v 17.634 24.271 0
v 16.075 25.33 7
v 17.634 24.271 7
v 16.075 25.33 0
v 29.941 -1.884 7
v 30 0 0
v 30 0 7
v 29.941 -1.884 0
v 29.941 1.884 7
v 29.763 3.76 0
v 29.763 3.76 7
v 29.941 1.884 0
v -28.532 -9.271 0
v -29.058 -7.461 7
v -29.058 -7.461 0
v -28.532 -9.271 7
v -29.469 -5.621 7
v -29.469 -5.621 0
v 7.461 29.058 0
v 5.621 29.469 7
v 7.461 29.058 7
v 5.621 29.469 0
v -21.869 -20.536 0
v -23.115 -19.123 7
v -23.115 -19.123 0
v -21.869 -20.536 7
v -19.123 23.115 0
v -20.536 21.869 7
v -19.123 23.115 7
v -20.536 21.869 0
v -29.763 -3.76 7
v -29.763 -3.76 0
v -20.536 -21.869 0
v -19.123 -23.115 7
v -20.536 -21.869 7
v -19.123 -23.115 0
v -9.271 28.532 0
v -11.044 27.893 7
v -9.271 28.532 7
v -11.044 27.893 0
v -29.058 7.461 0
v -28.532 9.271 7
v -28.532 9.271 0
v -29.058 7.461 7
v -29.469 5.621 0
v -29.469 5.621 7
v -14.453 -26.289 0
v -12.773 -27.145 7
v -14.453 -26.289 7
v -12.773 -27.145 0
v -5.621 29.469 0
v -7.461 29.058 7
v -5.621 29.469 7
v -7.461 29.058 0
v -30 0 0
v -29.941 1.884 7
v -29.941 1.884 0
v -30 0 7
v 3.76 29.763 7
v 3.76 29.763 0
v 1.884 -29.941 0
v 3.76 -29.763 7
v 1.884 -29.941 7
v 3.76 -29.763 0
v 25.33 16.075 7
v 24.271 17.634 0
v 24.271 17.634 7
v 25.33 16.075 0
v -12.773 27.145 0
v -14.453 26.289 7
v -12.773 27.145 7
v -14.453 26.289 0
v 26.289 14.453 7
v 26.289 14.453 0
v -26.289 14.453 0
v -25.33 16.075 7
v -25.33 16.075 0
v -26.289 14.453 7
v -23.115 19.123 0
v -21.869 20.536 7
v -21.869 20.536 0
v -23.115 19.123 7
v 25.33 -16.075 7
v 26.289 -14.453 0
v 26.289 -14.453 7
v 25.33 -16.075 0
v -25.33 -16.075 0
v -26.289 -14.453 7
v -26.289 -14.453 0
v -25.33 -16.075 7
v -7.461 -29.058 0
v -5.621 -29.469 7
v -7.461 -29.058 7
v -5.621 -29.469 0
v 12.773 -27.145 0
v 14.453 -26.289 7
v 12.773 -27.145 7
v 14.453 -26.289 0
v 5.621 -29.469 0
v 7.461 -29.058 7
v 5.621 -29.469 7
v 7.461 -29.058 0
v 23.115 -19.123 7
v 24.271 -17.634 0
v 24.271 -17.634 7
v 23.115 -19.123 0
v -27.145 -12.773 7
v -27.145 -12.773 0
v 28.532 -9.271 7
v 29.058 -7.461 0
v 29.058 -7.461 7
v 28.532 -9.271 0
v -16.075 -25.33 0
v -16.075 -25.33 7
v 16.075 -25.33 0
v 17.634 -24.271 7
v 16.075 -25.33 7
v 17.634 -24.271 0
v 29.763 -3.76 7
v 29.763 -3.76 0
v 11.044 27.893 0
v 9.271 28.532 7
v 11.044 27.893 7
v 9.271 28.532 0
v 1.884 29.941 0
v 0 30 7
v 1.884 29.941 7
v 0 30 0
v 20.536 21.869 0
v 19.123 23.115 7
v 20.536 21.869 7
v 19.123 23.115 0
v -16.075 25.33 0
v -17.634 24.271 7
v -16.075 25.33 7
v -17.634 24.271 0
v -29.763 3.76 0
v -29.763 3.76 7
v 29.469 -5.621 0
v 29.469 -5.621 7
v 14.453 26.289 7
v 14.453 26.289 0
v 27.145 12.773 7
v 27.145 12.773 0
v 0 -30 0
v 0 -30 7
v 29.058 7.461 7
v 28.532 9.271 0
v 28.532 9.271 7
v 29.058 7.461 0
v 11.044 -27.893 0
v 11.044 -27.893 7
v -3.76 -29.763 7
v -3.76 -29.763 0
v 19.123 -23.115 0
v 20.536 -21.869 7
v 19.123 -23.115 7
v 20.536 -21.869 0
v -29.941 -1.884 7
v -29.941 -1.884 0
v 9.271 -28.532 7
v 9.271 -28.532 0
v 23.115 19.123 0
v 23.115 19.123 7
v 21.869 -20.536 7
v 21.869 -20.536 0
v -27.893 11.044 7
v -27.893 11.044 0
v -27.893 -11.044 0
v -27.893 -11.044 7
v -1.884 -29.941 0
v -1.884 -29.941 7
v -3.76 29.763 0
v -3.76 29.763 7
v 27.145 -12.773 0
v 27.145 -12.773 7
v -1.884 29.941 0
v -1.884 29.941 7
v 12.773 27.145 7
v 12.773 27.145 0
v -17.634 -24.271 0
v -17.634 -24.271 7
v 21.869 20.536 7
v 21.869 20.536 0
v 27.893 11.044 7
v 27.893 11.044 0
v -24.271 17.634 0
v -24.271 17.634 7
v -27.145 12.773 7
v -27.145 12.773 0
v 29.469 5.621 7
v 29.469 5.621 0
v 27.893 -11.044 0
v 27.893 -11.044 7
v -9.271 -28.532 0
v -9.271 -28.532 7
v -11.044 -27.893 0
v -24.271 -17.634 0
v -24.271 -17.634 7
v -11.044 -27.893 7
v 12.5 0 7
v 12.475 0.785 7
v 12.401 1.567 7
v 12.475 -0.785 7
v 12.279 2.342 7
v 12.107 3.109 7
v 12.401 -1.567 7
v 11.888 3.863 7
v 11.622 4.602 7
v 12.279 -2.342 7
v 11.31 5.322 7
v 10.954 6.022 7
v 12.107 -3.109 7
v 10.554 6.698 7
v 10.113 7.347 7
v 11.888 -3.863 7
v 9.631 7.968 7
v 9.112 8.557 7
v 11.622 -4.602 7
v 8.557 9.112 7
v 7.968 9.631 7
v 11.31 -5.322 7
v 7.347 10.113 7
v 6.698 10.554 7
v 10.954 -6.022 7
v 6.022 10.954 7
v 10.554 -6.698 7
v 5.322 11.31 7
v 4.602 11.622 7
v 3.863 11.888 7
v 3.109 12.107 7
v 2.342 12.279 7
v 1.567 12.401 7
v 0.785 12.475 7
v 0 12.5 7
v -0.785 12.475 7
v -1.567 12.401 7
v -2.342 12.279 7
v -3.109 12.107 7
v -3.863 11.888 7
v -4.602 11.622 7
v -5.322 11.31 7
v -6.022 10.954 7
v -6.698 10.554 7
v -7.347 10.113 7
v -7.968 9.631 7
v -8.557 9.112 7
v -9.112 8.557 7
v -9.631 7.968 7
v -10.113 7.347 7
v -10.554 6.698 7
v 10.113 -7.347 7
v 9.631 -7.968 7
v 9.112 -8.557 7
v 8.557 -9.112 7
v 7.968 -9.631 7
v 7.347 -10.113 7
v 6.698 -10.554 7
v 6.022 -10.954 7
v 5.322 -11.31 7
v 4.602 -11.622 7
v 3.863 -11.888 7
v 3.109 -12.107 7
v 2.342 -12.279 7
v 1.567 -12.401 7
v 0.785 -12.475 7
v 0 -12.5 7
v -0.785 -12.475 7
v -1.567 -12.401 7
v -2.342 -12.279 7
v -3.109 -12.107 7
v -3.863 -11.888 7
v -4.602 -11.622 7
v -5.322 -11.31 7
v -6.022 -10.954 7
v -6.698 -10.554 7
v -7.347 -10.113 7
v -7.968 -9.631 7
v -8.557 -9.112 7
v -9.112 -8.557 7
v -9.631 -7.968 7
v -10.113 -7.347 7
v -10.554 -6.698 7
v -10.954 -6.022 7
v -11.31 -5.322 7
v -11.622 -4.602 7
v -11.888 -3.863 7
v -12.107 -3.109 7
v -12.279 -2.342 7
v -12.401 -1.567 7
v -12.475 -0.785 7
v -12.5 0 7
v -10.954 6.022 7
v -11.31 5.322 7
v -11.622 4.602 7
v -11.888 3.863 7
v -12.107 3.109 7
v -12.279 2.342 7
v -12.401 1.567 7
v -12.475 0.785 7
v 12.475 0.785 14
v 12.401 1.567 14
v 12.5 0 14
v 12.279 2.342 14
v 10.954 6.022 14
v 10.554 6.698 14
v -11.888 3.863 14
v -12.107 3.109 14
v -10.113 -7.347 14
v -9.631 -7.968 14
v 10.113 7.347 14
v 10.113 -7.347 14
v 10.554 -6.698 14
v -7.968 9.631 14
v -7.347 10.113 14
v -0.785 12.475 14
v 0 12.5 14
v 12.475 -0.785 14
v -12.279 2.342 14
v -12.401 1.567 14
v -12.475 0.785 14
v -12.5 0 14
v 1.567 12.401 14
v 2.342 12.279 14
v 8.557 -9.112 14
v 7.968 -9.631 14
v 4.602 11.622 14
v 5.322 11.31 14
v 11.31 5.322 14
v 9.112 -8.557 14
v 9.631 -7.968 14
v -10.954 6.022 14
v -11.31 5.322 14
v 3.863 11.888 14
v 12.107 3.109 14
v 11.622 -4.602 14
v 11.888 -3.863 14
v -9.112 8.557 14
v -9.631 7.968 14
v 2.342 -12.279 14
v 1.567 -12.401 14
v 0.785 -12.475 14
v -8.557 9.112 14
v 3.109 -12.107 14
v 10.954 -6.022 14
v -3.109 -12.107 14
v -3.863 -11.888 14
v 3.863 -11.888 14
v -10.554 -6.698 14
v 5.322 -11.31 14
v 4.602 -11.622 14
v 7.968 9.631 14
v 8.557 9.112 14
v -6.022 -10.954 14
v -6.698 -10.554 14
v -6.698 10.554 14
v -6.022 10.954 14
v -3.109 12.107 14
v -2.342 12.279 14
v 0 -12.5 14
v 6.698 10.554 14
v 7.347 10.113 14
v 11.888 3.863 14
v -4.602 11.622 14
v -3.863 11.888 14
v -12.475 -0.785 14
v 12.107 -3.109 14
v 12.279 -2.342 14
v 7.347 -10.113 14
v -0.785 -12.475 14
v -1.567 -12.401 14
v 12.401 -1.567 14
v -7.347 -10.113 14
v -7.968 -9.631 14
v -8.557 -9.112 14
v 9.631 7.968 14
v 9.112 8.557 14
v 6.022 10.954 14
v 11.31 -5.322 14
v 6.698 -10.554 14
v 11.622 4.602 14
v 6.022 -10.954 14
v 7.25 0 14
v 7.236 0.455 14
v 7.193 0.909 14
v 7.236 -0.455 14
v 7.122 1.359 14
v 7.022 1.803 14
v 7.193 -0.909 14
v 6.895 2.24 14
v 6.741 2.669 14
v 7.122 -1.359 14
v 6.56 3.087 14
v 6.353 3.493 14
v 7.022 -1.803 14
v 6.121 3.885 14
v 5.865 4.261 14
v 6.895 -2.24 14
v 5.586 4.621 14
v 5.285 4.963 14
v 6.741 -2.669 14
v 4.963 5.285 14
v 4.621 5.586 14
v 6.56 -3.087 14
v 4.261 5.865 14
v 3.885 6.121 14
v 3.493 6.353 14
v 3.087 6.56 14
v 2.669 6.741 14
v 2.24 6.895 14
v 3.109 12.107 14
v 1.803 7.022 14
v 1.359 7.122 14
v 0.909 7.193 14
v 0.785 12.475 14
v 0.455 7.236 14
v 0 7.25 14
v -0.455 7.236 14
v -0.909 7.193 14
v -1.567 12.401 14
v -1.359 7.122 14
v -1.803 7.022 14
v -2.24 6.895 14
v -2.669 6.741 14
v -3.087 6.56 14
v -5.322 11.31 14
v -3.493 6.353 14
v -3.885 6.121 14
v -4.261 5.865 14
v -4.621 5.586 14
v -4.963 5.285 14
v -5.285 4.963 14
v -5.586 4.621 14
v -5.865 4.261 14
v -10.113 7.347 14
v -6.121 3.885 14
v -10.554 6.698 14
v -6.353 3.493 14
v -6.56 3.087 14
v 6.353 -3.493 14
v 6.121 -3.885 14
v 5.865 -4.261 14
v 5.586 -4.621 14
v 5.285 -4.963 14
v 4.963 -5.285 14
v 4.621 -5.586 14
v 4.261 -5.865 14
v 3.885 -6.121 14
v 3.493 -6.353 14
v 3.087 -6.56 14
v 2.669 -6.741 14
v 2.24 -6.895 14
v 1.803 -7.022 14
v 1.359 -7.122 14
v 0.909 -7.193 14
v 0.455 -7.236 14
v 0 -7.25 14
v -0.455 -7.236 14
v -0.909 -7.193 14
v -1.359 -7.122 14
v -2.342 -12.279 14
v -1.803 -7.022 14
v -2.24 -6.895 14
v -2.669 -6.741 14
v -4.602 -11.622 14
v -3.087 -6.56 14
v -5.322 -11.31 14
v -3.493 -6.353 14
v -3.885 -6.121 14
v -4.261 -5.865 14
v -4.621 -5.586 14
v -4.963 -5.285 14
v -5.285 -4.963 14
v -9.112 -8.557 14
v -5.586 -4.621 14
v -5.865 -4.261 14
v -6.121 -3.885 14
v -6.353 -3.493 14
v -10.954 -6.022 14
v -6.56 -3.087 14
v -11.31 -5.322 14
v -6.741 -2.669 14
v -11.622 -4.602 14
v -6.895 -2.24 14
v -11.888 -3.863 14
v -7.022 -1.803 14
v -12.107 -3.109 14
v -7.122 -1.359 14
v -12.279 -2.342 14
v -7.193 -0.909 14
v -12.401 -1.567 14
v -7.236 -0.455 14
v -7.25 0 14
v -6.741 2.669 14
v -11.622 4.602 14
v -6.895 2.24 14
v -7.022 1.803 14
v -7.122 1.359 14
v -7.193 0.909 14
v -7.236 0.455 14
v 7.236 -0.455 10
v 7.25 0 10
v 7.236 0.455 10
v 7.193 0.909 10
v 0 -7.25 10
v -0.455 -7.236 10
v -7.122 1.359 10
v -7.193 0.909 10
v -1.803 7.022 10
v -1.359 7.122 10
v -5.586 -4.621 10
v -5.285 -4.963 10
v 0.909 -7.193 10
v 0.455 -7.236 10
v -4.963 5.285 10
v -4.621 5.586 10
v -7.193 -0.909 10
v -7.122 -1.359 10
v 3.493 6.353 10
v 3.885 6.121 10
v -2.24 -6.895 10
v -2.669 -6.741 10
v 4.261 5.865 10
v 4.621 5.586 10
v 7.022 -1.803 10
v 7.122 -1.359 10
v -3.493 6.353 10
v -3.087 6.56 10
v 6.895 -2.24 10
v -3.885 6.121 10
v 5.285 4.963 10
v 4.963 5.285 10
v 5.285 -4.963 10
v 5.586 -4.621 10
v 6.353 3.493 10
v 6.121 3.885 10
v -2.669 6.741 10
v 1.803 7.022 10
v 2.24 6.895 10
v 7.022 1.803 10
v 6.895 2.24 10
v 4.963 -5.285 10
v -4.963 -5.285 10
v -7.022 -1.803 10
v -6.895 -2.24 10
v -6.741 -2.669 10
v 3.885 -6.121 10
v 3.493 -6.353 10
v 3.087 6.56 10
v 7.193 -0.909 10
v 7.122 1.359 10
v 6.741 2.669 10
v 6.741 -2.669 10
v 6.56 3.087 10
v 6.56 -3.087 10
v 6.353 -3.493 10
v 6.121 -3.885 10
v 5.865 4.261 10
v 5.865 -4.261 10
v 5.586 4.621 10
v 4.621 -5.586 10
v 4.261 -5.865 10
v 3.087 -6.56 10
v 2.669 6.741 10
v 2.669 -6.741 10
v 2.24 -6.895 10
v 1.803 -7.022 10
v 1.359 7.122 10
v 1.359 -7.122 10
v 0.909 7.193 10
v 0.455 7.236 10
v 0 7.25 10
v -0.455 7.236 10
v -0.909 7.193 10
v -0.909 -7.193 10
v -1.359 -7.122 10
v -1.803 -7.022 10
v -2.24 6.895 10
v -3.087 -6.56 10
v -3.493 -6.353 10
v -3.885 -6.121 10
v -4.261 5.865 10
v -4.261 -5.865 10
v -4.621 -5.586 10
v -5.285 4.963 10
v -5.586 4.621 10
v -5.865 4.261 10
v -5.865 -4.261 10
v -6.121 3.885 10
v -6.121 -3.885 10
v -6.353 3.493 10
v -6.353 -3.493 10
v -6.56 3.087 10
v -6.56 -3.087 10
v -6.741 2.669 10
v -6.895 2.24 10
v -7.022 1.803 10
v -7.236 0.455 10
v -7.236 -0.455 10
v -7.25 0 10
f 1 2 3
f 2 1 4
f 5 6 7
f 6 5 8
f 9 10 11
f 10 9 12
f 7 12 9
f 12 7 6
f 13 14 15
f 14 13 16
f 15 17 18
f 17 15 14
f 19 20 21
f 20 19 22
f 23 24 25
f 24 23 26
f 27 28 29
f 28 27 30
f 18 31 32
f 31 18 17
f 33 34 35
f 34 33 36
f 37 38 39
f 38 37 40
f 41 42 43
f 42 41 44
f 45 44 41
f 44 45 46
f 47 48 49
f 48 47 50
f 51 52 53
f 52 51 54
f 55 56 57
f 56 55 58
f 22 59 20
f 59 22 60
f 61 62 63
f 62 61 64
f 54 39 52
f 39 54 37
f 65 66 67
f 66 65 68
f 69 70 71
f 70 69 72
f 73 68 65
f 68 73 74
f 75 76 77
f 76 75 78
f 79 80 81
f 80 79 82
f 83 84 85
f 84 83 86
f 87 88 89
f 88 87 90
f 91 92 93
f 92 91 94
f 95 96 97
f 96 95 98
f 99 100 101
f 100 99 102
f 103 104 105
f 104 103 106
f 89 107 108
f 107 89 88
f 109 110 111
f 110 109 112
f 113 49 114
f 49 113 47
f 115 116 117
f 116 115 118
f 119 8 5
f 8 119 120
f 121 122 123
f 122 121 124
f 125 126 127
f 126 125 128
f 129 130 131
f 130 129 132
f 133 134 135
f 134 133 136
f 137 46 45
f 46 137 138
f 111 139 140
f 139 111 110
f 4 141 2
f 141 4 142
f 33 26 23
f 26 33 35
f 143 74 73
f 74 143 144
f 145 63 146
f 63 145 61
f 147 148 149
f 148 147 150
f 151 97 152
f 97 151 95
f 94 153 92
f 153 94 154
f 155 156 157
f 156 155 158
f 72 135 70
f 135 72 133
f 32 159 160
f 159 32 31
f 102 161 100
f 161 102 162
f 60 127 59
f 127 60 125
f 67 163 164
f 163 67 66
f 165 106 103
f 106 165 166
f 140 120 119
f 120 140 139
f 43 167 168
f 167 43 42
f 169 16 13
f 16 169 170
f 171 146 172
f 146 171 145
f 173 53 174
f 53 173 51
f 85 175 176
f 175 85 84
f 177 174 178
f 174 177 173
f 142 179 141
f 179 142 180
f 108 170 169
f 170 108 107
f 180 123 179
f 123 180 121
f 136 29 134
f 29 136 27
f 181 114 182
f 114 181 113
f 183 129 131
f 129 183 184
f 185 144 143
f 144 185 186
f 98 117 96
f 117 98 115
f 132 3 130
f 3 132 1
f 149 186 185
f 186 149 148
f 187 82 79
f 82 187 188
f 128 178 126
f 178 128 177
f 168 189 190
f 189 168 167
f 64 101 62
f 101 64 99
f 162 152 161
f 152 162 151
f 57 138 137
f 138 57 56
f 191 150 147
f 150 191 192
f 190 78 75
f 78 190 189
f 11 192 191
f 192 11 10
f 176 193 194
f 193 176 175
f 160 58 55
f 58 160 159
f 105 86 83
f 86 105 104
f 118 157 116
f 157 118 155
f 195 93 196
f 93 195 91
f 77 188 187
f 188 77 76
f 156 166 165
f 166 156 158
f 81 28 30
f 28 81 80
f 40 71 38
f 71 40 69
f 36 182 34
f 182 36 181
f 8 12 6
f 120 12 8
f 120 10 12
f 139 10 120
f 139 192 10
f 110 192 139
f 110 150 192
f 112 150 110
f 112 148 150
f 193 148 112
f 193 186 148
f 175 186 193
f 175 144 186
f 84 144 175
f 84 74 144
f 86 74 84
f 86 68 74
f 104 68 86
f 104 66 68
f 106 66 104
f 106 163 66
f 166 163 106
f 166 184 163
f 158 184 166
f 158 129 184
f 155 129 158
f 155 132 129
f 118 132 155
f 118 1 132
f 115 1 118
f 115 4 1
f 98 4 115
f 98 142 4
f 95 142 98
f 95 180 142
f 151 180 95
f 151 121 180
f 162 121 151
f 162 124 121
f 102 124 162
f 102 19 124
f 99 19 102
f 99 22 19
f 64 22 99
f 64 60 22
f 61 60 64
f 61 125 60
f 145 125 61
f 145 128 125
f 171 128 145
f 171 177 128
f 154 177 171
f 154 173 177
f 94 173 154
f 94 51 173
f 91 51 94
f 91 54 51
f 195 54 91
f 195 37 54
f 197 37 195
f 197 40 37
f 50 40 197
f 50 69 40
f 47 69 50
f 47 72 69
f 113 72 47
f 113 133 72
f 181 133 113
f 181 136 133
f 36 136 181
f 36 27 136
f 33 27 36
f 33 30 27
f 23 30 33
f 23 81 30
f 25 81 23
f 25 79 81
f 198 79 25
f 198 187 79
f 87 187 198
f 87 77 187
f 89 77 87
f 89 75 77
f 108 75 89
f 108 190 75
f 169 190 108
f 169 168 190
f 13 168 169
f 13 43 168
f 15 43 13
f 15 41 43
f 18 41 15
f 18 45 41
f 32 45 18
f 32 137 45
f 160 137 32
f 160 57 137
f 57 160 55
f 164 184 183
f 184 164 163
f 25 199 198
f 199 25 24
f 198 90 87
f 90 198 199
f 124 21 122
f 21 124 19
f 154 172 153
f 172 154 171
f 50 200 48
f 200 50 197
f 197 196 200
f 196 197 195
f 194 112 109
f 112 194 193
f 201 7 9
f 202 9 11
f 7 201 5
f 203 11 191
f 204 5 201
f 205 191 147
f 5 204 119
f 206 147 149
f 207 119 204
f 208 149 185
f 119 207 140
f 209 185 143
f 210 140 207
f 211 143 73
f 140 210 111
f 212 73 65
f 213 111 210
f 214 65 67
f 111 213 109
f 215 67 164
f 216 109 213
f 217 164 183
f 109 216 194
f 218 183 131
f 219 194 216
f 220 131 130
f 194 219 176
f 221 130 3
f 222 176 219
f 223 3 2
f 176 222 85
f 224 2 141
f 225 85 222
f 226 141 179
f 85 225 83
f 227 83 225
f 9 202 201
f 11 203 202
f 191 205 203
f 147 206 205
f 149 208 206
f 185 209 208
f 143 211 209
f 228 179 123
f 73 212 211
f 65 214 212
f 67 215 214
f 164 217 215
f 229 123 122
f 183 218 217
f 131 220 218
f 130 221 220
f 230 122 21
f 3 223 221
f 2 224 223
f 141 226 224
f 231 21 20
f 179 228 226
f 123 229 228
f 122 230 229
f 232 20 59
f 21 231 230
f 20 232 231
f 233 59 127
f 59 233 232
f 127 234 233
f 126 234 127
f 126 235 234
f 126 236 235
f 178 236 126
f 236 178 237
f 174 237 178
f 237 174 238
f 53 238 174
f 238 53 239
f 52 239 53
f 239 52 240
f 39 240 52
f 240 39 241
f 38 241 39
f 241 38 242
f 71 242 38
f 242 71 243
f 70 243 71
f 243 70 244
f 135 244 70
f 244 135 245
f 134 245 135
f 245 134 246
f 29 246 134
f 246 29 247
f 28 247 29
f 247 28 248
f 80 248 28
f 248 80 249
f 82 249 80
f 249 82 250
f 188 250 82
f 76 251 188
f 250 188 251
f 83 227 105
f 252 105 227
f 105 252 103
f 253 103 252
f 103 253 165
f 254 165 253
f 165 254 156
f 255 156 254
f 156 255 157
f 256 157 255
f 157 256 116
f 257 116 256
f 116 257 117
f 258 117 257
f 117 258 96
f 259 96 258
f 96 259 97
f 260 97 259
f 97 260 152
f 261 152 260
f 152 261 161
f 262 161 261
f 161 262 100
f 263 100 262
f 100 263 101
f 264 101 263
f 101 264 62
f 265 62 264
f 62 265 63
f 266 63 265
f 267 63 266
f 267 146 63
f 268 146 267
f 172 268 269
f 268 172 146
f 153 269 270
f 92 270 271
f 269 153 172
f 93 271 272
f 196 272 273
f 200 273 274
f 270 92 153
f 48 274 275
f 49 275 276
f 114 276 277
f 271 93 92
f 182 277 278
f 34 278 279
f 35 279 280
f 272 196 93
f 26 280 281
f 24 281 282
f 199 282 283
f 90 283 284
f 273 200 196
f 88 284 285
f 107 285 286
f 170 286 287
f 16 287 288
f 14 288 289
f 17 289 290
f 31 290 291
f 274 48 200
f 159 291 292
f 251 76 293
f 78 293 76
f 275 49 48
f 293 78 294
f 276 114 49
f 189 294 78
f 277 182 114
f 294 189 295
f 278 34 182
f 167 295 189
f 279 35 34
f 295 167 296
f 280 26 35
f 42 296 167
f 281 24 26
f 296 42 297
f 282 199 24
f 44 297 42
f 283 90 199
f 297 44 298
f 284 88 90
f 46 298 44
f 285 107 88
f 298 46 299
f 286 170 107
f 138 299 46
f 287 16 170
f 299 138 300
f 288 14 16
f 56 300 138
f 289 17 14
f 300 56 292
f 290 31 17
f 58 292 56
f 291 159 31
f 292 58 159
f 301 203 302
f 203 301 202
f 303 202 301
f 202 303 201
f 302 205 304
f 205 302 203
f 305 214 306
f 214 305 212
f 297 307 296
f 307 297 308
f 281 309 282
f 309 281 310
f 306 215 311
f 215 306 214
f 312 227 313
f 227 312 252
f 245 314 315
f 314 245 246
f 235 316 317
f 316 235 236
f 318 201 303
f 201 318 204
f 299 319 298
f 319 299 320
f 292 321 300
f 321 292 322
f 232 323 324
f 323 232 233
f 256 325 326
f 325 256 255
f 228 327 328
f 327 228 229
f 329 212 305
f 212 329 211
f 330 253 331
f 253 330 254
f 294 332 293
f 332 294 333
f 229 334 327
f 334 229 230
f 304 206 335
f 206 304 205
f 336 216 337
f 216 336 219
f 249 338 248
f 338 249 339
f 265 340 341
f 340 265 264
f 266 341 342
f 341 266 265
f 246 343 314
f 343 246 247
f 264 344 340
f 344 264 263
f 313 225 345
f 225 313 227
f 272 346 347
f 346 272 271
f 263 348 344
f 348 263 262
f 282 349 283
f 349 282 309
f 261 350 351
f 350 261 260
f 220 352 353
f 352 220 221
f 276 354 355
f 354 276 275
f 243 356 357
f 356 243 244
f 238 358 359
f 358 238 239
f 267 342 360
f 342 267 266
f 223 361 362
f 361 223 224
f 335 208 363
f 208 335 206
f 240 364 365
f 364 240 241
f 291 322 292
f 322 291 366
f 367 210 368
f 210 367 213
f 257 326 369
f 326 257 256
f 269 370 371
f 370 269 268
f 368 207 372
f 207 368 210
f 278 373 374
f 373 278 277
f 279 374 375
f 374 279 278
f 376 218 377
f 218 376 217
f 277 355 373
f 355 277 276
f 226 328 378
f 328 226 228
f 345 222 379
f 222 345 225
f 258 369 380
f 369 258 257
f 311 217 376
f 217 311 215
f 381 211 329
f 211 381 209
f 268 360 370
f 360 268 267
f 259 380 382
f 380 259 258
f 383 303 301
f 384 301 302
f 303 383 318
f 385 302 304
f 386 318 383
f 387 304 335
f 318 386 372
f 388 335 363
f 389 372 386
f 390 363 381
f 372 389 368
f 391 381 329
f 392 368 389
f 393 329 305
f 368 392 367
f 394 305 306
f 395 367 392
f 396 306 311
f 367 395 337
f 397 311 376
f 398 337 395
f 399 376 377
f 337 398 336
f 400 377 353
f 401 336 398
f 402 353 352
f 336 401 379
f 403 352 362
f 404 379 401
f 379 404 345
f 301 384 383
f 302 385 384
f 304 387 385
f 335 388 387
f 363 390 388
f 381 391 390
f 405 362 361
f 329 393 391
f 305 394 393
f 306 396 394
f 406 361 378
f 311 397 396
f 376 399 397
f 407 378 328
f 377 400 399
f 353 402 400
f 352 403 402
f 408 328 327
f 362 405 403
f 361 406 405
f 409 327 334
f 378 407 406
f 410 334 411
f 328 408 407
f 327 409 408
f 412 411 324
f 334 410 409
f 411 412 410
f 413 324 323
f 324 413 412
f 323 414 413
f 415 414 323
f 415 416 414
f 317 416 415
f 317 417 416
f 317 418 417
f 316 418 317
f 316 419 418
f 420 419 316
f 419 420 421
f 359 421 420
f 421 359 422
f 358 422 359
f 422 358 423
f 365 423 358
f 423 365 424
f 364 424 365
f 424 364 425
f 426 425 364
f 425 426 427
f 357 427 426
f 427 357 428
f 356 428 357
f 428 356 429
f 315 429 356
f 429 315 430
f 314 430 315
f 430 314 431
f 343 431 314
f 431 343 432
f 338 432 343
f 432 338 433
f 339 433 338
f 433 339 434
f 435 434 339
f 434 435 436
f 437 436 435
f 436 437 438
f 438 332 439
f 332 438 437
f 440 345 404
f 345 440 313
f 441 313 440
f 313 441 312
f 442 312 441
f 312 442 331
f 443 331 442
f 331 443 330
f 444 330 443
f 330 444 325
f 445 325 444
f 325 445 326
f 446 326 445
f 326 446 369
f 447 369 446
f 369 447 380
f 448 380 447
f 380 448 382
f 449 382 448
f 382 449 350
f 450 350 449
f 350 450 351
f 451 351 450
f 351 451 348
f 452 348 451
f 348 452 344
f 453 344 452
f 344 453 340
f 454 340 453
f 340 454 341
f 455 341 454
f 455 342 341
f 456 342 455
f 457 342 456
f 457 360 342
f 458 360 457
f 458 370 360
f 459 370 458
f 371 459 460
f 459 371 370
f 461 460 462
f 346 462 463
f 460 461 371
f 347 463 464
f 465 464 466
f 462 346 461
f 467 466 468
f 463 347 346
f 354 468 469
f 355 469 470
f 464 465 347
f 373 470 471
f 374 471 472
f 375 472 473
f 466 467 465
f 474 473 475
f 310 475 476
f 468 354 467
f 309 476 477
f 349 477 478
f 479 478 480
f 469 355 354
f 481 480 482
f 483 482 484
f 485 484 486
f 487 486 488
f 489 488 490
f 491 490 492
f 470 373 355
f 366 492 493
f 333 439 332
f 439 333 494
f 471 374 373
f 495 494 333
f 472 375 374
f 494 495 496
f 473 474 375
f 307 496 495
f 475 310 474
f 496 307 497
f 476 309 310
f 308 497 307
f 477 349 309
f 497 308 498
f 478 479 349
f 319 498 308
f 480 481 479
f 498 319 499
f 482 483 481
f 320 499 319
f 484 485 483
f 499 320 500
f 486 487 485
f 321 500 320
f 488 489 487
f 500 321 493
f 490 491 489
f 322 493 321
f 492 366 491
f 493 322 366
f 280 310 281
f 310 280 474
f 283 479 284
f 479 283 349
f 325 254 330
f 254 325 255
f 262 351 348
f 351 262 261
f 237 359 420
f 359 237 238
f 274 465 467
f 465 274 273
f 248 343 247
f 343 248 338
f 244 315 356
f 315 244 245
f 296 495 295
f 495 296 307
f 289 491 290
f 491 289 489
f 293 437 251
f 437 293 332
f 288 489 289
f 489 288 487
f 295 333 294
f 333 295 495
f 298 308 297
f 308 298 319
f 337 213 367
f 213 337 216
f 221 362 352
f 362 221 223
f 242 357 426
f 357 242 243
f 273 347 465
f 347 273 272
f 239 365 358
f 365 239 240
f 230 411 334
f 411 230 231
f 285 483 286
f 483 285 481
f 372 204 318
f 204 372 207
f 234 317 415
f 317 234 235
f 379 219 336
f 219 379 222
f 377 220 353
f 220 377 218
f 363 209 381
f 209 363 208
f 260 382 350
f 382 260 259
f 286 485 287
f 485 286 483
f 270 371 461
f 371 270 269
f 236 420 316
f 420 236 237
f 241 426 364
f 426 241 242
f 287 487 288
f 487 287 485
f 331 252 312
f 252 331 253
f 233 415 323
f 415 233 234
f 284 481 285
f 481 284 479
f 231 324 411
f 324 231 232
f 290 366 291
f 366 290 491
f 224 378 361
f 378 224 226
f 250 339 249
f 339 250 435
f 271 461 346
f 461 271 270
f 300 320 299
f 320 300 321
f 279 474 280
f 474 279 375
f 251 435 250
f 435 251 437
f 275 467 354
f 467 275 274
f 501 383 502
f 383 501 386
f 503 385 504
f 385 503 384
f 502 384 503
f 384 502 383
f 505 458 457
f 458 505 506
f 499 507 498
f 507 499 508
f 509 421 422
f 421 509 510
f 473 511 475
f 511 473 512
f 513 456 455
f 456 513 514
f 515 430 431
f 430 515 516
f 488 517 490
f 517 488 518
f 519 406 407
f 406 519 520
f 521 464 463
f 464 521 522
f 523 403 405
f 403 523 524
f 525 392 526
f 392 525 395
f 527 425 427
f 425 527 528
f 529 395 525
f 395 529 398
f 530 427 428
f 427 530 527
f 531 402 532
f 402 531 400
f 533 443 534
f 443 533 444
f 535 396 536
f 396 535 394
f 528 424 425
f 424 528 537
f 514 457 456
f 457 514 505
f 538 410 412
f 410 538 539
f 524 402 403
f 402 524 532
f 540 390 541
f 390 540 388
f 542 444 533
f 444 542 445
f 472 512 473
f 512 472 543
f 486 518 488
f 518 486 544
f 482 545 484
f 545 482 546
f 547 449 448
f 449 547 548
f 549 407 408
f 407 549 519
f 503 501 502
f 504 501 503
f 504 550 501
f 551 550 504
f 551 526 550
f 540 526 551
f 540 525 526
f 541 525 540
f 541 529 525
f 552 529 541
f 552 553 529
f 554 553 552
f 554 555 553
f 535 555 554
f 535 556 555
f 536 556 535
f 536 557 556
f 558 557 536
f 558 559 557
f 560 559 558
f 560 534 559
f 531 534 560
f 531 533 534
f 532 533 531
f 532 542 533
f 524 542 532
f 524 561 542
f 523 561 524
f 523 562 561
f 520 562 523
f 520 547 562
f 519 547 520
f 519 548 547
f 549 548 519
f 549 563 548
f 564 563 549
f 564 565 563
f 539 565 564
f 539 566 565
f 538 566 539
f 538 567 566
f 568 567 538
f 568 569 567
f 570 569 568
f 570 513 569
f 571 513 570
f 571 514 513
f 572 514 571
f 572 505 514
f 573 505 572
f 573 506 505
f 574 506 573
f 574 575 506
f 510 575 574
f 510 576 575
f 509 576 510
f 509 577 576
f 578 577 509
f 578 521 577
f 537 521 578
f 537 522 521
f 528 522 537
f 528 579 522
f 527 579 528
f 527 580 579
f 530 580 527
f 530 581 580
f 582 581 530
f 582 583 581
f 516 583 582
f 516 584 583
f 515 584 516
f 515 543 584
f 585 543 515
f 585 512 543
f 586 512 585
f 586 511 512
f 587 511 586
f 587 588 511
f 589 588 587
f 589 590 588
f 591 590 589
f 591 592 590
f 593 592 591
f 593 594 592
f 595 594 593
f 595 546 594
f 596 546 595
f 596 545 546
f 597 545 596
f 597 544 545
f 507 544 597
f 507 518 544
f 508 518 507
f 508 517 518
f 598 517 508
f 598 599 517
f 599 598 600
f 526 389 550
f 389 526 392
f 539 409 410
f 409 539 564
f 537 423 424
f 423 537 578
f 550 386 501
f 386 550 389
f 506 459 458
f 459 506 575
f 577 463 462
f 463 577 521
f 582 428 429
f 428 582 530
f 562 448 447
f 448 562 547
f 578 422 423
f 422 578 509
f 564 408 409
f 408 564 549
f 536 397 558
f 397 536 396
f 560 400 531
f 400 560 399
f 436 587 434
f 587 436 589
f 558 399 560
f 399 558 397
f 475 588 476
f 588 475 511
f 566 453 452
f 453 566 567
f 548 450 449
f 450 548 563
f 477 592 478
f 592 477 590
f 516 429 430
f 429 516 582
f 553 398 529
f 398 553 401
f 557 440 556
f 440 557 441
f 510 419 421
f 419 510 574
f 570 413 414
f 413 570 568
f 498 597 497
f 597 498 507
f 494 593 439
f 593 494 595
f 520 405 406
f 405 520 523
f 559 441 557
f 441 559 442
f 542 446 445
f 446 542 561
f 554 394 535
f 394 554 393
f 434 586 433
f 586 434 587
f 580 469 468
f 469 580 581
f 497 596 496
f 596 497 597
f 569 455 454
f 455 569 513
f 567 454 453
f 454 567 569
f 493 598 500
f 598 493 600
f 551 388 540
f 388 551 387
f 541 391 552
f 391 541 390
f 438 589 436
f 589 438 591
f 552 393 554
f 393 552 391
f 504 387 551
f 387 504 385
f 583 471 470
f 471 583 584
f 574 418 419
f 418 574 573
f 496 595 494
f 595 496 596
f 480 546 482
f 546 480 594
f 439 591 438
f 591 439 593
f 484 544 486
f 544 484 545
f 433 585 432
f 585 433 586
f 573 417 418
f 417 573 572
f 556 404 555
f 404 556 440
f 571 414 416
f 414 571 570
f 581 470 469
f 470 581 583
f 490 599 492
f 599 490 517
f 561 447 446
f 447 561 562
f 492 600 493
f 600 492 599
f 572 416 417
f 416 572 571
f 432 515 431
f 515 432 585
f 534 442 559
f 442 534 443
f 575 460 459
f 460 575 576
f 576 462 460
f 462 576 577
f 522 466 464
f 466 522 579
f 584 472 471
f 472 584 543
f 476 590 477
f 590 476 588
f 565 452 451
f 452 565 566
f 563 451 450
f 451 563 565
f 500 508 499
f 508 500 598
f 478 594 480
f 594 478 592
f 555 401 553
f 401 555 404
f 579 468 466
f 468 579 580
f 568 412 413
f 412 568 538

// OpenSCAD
$fn=100;
//all units in mm
H=130;    //total height of press cylinder
bthickness=5; // thickness of base
based=100; //diameter of base piece
wall=4; //thickness of cylinder wall
boltd=6.35 ;//diameter of threaded rod being used for exo
screenh=50; //height of screened part
screenw=2; //screen gap size
numscreen=50;//even number of screen holes
ribw=4;//width of rib
numbolt=5; //number of bolts
screwd=12.5;// diameter of drive screw used
nutthickness=10;//thickness of rim around nut


D=based-2*boltd*2.3622;    //outter diameter of press
h=H-bthickness; //height of inner cylinder
d=D-2*wall; //inner diameter of press
dp=d-2;   //outter diameter of press plunger
boltholed=1.1111*boltd+1;
screenangle=360/(numscreen/2);
boltangle=360/numbolt;
numboltribs=numbolt;
numnonboltribs=0;
anglenonboltribs=boltangle;
plungerd=d-2;//diameter of plunger
plungerh=7;

module cylinders() {

cylinder(plungerh,d=plungerd);
translate([0,0,plungerh])
cylinder(plungerh,d=screwd*2);
}

module psupports(){
	for (i = [1:numboltribs]) {
	rotate([0,0,boltangle*i])
translate([0,0,plungerh+plungerh/4])
	cube([ribw,plungerd-4,plungerh/2],center=true);
}}

difference(){
union(){
cylinders();
//psupports();
}

translate([0,0,plungerh+3])
cylinder(plungerh,d=screwd+2);

}
